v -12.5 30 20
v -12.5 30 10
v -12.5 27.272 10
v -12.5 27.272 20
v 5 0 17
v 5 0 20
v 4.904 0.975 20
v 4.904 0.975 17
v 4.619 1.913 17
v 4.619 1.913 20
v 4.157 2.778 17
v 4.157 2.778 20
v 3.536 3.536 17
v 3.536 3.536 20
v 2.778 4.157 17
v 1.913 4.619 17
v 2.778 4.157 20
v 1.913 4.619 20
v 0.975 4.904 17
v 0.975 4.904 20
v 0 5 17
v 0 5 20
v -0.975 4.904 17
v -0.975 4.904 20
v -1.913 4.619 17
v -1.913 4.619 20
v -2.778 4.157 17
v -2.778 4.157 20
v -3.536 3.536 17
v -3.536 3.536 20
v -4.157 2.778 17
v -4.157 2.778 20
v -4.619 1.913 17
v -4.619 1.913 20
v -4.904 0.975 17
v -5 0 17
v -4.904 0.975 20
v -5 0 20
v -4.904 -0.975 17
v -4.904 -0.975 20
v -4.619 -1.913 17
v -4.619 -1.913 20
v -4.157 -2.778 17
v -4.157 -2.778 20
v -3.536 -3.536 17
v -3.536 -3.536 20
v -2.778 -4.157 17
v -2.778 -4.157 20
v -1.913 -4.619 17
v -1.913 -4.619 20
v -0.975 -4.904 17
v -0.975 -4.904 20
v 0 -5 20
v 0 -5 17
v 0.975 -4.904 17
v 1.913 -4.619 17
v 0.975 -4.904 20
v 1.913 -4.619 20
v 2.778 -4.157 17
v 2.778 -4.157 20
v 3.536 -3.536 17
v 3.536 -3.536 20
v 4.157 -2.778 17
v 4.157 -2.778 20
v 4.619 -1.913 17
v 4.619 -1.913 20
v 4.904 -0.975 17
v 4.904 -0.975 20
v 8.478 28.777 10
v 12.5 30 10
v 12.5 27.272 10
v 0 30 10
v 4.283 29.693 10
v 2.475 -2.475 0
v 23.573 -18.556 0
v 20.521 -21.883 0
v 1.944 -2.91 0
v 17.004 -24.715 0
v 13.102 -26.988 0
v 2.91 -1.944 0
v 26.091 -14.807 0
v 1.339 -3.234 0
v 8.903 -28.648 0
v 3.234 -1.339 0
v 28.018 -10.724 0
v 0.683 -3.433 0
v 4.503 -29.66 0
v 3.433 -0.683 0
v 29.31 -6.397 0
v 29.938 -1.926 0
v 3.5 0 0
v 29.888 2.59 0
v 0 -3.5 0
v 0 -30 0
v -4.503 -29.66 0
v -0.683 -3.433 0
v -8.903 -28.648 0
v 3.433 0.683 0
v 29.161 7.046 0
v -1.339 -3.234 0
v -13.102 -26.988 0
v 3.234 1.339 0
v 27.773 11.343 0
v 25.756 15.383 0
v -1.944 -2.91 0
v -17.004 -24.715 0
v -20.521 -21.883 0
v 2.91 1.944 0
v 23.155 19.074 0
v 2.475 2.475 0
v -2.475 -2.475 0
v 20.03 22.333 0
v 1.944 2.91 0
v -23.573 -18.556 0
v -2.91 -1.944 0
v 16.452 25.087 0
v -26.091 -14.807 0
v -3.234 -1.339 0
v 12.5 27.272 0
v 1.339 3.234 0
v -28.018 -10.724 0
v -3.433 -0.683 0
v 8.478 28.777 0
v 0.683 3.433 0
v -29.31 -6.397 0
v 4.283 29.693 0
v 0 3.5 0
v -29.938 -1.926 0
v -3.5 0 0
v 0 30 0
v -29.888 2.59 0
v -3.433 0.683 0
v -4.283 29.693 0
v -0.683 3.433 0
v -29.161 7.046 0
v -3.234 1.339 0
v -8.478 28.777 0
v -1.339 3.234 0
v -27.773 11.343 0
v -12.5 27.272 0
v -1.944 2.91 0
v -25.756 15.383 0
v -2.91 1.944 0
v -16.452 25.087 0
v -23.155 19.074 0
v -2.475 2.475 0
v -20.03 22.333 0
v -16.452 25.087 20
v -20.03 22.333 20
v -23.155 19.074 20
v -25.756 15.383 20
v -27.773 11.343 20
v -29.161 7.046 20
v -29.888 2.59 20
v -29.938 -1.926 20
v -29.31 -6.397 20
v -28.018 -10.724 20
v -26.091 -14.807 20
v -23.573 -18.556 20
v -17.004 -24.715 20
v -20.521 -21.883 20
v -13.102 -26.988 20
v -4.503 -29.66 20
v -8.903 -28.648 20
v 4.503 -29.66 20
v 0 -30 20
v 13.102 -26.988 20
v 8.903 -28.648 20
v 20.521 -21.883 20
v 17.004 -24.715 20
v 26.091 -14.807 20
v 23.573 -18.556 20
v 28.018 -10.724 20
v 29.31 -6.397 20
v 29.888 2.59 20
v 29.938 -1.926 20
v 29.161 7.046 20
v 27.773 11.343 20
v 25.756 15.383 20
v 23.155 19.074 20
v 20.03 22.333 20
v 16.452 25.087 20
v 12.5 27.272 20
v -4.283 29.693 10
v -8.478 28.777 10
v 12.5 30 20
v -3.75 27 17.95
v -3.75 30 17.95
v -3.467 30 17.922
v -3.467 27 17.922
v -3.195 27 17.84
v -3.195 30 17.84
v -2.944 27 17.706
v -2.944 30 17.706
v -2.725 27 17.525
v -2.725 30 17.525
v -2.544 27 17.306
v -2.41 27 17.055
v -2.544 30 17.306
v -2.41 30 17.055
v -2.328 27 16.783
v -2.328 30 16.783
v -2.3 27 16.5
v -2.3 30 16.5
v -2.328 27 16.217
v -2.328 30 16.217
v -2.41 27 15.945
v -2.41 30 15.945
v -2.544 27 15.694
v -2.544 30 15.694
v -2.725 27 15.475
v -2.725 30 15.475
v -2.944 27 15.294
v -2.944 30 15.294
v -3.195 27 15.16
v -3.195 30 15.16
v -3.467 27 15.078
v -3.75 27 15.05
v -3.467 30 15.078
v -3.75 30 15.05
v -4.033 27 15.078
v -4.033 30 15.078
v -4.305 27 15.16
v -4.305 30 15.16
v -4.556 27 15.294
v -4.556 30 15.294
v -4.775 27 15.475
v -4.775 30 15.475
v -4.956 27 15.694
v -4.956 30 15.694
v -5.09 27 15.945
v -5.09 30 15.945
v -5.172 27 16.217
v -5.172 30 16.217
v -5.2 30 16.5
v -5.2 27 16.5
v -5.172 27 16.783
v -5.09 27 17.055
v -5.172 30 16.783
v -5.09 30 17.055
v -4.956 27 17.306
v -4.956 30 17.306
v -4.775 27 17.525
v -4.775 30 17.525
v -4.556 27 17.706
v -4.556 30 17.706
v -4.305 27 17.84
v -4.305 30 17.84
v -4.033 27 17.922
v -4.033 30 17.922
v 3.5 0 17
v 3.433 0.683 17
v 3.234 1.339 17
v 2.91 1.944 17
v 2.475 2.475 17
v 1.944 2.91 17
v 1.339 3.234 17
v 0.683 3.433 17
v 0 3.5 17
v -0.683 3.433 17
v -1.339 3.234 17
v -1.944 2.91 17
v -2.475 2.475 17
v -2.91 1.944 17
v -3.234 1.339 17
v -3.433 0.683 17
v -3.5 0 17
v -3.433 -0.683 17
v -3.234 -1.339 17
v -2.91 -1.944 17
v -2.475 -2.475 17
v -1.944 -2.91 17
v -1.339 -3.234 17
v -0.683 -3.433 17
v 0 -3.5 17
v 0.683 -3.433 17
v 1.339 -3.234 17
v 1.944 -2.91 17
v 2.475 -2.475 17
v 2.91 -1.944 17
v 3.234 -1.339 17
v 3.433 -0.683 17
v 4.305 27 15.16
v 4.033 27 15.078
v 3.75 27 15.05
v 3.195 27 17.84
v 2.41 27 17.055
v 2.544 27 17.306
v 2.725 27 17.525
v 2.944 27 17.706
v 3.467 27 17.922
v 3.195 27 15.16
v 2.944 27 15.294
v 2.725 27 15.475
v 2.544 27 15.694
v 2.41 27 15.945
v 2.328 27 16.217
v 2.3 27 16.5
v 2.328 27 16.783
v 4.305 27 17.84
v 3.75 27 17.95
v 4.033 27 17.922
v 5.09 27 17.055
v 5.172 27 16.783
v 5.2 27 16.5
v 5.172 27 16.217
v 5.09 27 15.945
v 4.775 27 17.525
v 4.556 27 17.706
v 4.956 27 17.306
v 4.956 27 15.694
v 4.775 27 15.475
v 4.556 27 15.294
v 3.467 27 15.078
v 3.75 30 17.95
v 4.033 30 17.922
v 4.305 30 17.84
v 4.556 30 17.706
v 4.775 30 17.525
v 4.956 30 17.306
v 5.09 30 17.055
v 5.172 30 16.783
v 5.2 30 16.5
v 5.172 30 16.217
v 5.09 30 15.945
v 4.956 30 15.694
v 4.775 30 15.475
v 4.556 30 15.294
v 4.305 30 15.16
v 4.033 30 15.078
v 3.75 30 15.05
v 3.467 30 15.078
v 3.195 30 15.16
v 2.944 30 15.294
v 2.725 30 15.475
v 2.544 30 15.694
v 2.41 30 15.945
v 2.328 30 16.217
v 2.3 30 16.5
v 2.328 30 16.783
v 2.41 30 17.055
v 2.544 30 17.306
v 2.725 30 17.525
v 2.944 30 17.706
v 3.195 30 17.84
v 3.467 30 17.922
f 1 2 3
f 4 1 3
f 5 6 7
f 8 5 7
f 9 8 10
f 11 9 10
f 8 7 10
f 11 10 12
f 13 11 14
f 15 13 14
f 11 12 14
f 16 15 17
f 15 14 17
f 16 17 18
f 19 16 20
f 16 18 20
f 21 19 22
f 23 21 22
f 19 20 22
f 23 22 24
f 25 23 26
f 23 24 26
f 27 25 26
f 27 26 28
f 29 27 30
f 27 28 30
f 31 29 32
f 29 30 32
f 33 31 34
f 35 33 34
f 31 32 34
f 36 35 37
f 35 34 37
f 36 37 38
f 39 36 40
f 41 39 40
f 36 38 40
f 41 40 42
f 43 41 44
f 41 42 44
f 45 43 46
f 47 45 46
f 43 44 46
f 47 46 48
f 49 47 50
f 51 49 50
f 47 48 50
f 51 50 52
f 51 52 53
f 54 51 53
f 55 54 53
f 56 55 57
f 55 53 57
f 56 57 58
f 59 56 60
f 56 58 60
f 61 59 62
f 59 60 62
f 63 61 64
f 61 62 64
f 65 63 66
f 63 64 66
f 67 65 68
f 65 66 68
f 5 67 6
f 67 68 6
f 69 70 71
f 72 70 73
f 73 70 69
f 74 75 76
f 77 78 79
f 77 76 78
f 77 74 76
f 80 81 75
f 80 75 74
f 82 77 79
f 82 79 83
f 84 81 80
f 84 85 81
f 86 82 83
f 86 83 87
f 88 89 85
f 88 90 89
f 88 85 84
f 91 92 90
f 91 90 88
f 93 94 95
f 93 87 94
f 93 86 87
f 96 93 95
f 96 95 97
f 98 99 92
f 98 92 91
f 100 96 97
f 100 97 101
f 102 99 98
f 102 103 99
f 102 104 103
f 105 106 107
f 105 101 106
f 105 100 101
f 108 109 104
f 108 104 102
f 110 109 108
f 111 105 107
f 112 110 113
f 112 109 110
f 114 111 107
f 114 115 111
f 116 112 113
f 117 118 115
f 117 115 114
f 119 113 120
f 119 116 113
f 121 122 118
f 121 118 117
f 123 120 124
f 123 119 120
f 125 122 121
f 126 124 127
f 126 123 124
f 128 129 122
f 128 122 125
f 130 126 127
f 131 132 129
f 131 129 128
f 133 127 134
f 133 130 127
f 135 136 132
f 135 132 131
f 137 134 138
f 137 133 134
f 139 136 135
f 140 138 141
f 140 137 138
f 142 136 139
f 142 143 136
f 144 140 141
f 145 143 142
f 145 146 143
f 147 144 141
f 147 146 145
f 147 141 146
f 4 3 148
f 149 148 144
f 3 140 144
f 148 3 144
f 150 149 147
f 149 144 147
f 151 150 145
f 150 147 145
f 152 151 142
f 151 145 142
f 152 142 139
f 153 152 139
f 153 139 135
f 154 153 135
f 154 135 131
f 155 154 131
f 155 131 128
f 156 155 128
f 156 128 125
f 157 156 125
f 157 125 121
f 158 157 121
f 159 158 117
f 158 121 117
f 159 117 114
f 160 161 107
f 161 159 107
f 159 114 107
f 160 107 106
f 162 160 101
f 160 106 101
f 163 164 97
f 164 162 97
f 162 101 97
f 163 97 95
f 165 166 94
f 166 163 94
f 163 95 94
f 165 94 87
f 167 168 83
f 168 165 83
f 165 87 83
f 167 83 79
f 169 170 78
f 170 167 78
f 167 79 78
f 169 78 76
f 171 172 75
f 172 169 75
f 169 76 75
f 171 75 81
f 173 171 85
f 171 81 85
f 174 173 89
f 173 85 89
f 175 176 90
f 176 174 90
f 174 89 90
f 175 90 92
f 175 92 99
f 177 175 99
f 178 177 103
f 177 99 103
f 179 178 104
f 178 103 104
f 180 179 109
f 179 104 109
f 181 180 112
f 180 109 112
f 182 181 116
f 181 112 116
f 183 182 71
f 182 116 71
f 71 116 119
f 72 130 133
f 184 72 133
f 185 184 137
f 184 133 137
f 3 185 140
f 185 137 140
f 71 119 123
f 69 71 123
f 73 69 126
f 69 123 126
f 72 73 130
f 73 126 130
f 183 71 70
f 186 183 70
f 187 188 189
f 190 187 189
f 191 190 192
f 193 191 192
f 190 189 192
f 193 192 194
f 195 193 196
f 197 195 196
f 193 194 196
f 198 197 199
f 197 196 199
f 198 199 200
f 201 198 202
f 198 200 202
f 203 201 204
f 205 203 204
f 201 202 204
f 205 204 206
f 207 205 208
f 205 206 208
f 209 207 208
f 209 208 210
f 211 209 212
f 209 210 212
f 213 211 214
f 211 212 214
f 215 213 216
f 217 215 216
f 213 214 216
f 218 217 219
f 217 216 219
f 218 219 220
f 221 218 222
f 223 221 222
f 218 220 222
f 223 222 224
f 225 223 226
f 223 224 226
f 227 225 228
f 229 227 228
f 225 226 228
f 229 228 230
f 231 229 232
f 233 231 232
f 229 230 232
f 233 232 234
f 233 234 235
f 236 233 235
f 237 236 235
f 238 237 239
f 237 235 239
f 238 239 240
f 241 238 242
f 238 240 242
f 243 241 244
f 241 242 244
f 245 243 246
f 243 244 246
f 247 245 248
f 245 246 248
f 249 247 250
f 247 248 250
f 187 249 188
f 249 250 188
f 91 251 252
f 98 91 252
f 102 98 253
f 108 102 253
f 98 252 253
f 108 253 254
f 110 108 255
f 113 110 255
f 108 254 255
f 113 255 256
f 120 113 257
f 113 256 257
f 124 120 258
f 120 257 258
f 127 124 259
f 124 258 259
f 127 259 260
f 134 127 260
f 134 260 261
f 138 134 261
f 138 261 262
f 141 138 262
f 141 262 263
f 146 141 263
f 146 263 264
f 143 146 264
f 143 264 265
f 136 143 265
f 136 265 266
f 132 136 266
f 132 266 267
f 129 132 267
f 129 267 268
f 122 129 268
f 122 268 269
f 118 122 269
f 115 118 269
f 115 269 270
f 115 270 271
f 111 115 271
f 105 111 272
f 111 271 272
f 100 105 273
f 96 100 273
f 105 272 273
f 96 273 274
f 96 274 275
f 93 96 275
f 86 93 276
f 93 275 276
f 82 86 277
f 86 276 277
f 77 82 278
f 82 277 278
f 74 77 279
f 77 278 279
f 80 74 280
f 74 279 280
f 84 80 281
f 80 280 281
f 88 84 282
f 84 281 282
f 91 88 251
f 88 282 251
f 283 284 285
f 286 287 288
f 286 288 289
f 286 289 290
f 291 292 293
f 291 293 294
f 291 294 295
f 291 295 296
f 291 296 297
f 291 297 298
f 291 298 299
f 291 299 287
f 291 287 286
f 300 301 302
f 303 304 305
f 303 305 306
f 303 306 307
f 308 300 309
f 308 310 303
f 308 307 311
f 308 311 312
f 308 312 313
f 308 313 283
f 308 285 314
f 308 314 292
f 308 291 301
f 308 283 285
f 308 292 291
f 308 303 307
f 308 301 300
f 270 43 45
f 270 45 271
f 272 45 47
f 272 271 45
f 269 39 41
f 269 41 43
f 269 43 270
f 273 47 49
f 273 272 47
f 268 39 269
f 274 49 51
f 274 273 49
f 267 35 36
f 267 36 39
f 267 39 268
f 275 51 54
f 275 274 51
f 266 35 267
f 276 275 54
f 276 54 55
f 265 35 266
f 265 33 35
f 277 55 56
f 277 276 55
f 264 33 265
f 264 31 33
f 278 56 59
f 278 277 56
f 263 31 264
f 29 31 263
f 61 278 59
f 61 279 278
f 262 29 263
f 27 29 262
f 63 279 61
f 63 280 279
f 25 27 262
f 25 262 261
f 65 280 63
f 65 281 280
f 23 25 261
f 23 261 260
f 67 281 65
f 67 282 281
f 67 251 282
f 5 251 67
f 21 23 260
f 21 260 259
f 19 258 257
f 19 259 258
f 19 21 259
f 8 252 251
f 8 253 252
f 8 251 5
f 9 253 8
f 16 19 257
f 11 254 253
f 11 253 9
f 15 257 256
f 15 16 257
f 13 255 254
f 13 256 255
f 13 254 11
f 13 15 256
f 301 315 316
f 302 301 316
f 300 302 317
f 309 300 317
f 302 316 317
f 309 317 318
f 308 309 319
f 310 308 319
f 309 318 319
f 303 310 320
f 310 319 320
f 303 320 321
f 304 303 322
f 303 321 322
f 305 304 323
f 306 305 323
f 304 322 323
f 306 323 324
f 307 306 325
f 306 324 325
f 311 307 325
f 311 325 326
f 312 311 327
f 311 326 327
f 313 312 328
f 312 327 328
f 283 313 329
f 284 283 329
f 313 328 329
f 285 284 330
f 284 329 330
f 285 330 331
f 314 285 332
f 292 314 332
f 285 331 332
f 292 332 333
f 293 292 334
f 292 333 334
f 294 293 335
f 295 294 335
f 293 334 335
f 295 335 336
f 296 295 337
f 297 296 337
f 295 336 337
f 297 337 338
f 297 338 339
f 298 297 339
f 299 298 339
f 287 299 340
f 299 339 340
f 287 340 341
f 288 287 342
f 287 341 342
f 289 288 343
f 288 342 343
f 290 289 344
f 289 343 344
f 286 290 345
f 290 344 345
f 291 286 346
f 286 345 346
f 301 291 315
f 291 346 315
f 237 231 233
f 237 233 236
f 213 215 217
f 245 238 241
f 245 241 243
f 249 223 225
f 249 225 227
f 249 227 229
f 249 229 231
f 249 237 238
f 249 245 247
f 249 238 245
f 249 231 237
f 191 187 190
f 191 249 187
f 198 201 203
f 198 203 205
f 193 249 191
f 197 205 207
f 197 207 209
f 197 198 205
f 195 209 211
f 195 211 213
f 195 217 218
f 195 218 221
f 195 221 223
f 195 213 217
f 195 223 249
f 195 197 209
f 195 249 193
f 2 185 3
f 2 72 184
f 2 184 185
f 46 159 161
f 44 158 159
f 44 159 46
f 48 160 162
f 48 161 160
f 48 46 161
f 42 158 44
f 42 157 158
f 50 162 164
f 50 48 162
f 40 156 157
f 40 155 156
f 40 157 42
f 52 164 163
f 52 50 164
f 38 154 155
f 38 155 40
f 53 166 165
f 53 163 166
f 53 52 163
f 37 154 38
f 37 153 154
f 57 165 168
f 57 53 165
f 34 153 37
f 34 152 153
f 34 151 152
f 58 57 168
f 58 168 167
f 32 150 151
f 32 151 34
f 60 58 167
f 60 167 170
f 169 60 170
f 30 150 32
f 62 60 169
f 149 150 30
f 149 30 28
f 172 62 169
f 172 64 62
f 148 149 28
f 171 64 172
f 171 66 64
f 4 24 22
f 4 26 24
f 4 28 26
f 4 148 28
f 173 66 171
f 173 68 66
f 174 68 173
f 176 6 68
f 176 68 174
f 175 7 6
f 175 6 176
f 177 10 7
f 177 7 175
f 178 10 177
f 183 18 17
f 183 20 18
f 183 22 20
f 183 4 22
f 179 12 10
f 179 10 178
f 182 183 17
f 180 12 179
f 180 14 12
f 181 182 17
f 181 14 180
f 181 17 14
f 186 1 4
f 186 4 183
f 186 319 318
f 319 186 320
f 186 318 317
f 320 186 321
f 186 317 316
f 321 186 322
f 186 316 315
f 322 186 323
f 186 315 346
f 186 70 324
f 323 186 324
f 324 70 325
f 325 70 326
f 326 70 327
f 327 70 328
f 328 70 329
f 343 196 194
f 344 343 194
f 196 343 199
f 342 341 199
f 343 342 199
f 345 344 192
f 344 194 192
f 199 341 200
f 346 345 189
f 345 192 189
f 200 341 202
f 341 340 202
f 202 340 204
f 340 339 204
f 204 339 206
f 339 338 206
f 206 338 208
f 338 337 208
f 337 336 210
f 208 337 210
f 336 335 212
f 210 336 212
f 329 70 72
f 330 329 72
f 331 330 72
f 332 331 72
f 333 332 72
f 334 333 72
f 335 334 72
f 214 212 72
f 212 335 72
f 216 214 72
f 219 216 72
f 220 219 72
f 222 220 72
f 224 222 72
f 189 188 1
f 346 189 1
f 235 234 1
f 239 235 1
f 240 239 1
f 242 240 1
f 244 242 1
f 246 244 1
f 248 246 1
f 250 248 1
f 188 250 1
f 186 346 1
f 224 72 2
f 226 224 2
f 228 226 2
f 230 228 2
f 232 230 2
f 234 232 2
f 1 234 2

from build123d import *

# Parameters (mm, degrees)
SKETCH_1_R          = 30
EXTRUDE_1_DEPTH     = 20
EXTRUDE_2_DEPTH     = 10
EXTRUDE_3_DEPTH     = 10
CUT_EXTRUDE_1_DEPTH = 10
SKETCH_5_R          = 1.45
CUT_EXTRUDE_2_DEPTH = 3
SKETCH_7_R          = 3.5
CUT_EXTRUDE_4_DEPTH = 47.904157598
SKETCH_8_R          = 5
CUT_EXTRUDE_5_DEPTH = 3


with BuildPart() as part:
    # 草图1 → 凸台-拉伸1 (new body)
    with BuildSketch(Plane.XY):
        Circle(SKETCH_1_R)
    extrude(amount=EXTRUDE_1_DEPTH)

    # 草图2 → 凸台-拉伸2 (add)
    with BuildSketch(Plane(origin=(0, 0, 0), x_dir=(-1, 0, 0), z_dir=(0, 0, -1))):
        with BuildLine():
            Line((0, 30), (-12.5, 30))
            Line((-12.5, 30), (-12.5, 27.271780287))
            ThreePointArc((-12.5, 27.271780287), (-6.397131834, 29.310010309), (0, 30))
        make_face()
        with BuildLine():
            Line((12.5, 30), (0, 30))
            ThreePointArc((0, 30), (6.397131834, 29.310010309), (12.5, 27.271780287))
            Line((12.5, 27.271780287), (12.5, 30))
        make_face()
    extrude(amount=-EXTRUDE_2_DEPTH)

    # 草图3 → 凸台-拉伸3 (add)
    with BuildSketch(Plane.XY.offset(10)):
        with BuildLine():
            Line((-12.5, 30), (-12.5, 27.271780287))
            ThreePointArc((-12.5, 27.271780287), (-6.397131834, 29.310010309), (0, 30))
            Line((0, 30), (-12.5, 30))
        make_face()
        with BuildLine():
            ThreePointArc((0, 30), (6.397131834, 29.310010309), (12.5, 27.271780287))
            Line((12.5, 27.271780287), (12.5, 30))
            Line((12.5, 30), (0, 30))
        make_face()
    extrude(amount=EXTRUDE_3_DEPTH)

    # 草图4 → 切除-拉伸1 (cut)
    with BuildSketch(Plane(origin=(0, 0, 0), x_dir=(-1, 0, 0), z_dir=(0, 0, -1))):
        with BuildLine():
            Line((-12.5, 30), (-12.5, 27.271780287))
            ThreePointArc((-12.5, 27.271780287), (-6.397131834, 29.310010309), (0, 30))
            Line((0, 30), (-12.5, 30))
        make_face()
        with BuildLine():
            ThreePointArc((0, 30), (6.397131834, 29.310010309), (12.5, 27.271780287))
            Line((12.5, 27.271780287), (12.5, 30))
            Line((12.5, 30), (0, 30))
        make_face()
    extrude(amount=-CUT_EXTRUDE_1_DEPTH, mode=Mode.SUBTRACT)

    # 草图5 → 切除-拉伸2 (cut)
    with BuildSketch(Plane(origin=(0, 30, 0), x_dir=(1, 0, 0), z_dir=(0, 1, 0))):
        with Locations((-3.75, -16.5)):
            Circle(SKETCH_5_R)
        with Locations((3.75, -16.5)):
            Circle(SKETCH_5_R)
    extrude(amount=-CUT_EXTRUDE_2_DEPTH, mode=Mode.SUBTRACT)

    # 草图7 → 切除-拉伸4 (cut, through all)
    with BuildSketch(Plane.XY.offset(20)):
        Circle(SKETCH_7_R)
    extrude(amount=-CUT_EXTRUDE_4_DEPTH, mode=Mode.SUBTRACT)

    # 草图8 → 切除-拉伸5 (cut)
    with BuildSketch(Plane.XY.offset(20)):
        Circle(SKETCH_8_R)
    extrude(amount=-CUT_EXTRUDE_5_DEPTH, mode=Mode.SUBTRACT)


solid = part.part
